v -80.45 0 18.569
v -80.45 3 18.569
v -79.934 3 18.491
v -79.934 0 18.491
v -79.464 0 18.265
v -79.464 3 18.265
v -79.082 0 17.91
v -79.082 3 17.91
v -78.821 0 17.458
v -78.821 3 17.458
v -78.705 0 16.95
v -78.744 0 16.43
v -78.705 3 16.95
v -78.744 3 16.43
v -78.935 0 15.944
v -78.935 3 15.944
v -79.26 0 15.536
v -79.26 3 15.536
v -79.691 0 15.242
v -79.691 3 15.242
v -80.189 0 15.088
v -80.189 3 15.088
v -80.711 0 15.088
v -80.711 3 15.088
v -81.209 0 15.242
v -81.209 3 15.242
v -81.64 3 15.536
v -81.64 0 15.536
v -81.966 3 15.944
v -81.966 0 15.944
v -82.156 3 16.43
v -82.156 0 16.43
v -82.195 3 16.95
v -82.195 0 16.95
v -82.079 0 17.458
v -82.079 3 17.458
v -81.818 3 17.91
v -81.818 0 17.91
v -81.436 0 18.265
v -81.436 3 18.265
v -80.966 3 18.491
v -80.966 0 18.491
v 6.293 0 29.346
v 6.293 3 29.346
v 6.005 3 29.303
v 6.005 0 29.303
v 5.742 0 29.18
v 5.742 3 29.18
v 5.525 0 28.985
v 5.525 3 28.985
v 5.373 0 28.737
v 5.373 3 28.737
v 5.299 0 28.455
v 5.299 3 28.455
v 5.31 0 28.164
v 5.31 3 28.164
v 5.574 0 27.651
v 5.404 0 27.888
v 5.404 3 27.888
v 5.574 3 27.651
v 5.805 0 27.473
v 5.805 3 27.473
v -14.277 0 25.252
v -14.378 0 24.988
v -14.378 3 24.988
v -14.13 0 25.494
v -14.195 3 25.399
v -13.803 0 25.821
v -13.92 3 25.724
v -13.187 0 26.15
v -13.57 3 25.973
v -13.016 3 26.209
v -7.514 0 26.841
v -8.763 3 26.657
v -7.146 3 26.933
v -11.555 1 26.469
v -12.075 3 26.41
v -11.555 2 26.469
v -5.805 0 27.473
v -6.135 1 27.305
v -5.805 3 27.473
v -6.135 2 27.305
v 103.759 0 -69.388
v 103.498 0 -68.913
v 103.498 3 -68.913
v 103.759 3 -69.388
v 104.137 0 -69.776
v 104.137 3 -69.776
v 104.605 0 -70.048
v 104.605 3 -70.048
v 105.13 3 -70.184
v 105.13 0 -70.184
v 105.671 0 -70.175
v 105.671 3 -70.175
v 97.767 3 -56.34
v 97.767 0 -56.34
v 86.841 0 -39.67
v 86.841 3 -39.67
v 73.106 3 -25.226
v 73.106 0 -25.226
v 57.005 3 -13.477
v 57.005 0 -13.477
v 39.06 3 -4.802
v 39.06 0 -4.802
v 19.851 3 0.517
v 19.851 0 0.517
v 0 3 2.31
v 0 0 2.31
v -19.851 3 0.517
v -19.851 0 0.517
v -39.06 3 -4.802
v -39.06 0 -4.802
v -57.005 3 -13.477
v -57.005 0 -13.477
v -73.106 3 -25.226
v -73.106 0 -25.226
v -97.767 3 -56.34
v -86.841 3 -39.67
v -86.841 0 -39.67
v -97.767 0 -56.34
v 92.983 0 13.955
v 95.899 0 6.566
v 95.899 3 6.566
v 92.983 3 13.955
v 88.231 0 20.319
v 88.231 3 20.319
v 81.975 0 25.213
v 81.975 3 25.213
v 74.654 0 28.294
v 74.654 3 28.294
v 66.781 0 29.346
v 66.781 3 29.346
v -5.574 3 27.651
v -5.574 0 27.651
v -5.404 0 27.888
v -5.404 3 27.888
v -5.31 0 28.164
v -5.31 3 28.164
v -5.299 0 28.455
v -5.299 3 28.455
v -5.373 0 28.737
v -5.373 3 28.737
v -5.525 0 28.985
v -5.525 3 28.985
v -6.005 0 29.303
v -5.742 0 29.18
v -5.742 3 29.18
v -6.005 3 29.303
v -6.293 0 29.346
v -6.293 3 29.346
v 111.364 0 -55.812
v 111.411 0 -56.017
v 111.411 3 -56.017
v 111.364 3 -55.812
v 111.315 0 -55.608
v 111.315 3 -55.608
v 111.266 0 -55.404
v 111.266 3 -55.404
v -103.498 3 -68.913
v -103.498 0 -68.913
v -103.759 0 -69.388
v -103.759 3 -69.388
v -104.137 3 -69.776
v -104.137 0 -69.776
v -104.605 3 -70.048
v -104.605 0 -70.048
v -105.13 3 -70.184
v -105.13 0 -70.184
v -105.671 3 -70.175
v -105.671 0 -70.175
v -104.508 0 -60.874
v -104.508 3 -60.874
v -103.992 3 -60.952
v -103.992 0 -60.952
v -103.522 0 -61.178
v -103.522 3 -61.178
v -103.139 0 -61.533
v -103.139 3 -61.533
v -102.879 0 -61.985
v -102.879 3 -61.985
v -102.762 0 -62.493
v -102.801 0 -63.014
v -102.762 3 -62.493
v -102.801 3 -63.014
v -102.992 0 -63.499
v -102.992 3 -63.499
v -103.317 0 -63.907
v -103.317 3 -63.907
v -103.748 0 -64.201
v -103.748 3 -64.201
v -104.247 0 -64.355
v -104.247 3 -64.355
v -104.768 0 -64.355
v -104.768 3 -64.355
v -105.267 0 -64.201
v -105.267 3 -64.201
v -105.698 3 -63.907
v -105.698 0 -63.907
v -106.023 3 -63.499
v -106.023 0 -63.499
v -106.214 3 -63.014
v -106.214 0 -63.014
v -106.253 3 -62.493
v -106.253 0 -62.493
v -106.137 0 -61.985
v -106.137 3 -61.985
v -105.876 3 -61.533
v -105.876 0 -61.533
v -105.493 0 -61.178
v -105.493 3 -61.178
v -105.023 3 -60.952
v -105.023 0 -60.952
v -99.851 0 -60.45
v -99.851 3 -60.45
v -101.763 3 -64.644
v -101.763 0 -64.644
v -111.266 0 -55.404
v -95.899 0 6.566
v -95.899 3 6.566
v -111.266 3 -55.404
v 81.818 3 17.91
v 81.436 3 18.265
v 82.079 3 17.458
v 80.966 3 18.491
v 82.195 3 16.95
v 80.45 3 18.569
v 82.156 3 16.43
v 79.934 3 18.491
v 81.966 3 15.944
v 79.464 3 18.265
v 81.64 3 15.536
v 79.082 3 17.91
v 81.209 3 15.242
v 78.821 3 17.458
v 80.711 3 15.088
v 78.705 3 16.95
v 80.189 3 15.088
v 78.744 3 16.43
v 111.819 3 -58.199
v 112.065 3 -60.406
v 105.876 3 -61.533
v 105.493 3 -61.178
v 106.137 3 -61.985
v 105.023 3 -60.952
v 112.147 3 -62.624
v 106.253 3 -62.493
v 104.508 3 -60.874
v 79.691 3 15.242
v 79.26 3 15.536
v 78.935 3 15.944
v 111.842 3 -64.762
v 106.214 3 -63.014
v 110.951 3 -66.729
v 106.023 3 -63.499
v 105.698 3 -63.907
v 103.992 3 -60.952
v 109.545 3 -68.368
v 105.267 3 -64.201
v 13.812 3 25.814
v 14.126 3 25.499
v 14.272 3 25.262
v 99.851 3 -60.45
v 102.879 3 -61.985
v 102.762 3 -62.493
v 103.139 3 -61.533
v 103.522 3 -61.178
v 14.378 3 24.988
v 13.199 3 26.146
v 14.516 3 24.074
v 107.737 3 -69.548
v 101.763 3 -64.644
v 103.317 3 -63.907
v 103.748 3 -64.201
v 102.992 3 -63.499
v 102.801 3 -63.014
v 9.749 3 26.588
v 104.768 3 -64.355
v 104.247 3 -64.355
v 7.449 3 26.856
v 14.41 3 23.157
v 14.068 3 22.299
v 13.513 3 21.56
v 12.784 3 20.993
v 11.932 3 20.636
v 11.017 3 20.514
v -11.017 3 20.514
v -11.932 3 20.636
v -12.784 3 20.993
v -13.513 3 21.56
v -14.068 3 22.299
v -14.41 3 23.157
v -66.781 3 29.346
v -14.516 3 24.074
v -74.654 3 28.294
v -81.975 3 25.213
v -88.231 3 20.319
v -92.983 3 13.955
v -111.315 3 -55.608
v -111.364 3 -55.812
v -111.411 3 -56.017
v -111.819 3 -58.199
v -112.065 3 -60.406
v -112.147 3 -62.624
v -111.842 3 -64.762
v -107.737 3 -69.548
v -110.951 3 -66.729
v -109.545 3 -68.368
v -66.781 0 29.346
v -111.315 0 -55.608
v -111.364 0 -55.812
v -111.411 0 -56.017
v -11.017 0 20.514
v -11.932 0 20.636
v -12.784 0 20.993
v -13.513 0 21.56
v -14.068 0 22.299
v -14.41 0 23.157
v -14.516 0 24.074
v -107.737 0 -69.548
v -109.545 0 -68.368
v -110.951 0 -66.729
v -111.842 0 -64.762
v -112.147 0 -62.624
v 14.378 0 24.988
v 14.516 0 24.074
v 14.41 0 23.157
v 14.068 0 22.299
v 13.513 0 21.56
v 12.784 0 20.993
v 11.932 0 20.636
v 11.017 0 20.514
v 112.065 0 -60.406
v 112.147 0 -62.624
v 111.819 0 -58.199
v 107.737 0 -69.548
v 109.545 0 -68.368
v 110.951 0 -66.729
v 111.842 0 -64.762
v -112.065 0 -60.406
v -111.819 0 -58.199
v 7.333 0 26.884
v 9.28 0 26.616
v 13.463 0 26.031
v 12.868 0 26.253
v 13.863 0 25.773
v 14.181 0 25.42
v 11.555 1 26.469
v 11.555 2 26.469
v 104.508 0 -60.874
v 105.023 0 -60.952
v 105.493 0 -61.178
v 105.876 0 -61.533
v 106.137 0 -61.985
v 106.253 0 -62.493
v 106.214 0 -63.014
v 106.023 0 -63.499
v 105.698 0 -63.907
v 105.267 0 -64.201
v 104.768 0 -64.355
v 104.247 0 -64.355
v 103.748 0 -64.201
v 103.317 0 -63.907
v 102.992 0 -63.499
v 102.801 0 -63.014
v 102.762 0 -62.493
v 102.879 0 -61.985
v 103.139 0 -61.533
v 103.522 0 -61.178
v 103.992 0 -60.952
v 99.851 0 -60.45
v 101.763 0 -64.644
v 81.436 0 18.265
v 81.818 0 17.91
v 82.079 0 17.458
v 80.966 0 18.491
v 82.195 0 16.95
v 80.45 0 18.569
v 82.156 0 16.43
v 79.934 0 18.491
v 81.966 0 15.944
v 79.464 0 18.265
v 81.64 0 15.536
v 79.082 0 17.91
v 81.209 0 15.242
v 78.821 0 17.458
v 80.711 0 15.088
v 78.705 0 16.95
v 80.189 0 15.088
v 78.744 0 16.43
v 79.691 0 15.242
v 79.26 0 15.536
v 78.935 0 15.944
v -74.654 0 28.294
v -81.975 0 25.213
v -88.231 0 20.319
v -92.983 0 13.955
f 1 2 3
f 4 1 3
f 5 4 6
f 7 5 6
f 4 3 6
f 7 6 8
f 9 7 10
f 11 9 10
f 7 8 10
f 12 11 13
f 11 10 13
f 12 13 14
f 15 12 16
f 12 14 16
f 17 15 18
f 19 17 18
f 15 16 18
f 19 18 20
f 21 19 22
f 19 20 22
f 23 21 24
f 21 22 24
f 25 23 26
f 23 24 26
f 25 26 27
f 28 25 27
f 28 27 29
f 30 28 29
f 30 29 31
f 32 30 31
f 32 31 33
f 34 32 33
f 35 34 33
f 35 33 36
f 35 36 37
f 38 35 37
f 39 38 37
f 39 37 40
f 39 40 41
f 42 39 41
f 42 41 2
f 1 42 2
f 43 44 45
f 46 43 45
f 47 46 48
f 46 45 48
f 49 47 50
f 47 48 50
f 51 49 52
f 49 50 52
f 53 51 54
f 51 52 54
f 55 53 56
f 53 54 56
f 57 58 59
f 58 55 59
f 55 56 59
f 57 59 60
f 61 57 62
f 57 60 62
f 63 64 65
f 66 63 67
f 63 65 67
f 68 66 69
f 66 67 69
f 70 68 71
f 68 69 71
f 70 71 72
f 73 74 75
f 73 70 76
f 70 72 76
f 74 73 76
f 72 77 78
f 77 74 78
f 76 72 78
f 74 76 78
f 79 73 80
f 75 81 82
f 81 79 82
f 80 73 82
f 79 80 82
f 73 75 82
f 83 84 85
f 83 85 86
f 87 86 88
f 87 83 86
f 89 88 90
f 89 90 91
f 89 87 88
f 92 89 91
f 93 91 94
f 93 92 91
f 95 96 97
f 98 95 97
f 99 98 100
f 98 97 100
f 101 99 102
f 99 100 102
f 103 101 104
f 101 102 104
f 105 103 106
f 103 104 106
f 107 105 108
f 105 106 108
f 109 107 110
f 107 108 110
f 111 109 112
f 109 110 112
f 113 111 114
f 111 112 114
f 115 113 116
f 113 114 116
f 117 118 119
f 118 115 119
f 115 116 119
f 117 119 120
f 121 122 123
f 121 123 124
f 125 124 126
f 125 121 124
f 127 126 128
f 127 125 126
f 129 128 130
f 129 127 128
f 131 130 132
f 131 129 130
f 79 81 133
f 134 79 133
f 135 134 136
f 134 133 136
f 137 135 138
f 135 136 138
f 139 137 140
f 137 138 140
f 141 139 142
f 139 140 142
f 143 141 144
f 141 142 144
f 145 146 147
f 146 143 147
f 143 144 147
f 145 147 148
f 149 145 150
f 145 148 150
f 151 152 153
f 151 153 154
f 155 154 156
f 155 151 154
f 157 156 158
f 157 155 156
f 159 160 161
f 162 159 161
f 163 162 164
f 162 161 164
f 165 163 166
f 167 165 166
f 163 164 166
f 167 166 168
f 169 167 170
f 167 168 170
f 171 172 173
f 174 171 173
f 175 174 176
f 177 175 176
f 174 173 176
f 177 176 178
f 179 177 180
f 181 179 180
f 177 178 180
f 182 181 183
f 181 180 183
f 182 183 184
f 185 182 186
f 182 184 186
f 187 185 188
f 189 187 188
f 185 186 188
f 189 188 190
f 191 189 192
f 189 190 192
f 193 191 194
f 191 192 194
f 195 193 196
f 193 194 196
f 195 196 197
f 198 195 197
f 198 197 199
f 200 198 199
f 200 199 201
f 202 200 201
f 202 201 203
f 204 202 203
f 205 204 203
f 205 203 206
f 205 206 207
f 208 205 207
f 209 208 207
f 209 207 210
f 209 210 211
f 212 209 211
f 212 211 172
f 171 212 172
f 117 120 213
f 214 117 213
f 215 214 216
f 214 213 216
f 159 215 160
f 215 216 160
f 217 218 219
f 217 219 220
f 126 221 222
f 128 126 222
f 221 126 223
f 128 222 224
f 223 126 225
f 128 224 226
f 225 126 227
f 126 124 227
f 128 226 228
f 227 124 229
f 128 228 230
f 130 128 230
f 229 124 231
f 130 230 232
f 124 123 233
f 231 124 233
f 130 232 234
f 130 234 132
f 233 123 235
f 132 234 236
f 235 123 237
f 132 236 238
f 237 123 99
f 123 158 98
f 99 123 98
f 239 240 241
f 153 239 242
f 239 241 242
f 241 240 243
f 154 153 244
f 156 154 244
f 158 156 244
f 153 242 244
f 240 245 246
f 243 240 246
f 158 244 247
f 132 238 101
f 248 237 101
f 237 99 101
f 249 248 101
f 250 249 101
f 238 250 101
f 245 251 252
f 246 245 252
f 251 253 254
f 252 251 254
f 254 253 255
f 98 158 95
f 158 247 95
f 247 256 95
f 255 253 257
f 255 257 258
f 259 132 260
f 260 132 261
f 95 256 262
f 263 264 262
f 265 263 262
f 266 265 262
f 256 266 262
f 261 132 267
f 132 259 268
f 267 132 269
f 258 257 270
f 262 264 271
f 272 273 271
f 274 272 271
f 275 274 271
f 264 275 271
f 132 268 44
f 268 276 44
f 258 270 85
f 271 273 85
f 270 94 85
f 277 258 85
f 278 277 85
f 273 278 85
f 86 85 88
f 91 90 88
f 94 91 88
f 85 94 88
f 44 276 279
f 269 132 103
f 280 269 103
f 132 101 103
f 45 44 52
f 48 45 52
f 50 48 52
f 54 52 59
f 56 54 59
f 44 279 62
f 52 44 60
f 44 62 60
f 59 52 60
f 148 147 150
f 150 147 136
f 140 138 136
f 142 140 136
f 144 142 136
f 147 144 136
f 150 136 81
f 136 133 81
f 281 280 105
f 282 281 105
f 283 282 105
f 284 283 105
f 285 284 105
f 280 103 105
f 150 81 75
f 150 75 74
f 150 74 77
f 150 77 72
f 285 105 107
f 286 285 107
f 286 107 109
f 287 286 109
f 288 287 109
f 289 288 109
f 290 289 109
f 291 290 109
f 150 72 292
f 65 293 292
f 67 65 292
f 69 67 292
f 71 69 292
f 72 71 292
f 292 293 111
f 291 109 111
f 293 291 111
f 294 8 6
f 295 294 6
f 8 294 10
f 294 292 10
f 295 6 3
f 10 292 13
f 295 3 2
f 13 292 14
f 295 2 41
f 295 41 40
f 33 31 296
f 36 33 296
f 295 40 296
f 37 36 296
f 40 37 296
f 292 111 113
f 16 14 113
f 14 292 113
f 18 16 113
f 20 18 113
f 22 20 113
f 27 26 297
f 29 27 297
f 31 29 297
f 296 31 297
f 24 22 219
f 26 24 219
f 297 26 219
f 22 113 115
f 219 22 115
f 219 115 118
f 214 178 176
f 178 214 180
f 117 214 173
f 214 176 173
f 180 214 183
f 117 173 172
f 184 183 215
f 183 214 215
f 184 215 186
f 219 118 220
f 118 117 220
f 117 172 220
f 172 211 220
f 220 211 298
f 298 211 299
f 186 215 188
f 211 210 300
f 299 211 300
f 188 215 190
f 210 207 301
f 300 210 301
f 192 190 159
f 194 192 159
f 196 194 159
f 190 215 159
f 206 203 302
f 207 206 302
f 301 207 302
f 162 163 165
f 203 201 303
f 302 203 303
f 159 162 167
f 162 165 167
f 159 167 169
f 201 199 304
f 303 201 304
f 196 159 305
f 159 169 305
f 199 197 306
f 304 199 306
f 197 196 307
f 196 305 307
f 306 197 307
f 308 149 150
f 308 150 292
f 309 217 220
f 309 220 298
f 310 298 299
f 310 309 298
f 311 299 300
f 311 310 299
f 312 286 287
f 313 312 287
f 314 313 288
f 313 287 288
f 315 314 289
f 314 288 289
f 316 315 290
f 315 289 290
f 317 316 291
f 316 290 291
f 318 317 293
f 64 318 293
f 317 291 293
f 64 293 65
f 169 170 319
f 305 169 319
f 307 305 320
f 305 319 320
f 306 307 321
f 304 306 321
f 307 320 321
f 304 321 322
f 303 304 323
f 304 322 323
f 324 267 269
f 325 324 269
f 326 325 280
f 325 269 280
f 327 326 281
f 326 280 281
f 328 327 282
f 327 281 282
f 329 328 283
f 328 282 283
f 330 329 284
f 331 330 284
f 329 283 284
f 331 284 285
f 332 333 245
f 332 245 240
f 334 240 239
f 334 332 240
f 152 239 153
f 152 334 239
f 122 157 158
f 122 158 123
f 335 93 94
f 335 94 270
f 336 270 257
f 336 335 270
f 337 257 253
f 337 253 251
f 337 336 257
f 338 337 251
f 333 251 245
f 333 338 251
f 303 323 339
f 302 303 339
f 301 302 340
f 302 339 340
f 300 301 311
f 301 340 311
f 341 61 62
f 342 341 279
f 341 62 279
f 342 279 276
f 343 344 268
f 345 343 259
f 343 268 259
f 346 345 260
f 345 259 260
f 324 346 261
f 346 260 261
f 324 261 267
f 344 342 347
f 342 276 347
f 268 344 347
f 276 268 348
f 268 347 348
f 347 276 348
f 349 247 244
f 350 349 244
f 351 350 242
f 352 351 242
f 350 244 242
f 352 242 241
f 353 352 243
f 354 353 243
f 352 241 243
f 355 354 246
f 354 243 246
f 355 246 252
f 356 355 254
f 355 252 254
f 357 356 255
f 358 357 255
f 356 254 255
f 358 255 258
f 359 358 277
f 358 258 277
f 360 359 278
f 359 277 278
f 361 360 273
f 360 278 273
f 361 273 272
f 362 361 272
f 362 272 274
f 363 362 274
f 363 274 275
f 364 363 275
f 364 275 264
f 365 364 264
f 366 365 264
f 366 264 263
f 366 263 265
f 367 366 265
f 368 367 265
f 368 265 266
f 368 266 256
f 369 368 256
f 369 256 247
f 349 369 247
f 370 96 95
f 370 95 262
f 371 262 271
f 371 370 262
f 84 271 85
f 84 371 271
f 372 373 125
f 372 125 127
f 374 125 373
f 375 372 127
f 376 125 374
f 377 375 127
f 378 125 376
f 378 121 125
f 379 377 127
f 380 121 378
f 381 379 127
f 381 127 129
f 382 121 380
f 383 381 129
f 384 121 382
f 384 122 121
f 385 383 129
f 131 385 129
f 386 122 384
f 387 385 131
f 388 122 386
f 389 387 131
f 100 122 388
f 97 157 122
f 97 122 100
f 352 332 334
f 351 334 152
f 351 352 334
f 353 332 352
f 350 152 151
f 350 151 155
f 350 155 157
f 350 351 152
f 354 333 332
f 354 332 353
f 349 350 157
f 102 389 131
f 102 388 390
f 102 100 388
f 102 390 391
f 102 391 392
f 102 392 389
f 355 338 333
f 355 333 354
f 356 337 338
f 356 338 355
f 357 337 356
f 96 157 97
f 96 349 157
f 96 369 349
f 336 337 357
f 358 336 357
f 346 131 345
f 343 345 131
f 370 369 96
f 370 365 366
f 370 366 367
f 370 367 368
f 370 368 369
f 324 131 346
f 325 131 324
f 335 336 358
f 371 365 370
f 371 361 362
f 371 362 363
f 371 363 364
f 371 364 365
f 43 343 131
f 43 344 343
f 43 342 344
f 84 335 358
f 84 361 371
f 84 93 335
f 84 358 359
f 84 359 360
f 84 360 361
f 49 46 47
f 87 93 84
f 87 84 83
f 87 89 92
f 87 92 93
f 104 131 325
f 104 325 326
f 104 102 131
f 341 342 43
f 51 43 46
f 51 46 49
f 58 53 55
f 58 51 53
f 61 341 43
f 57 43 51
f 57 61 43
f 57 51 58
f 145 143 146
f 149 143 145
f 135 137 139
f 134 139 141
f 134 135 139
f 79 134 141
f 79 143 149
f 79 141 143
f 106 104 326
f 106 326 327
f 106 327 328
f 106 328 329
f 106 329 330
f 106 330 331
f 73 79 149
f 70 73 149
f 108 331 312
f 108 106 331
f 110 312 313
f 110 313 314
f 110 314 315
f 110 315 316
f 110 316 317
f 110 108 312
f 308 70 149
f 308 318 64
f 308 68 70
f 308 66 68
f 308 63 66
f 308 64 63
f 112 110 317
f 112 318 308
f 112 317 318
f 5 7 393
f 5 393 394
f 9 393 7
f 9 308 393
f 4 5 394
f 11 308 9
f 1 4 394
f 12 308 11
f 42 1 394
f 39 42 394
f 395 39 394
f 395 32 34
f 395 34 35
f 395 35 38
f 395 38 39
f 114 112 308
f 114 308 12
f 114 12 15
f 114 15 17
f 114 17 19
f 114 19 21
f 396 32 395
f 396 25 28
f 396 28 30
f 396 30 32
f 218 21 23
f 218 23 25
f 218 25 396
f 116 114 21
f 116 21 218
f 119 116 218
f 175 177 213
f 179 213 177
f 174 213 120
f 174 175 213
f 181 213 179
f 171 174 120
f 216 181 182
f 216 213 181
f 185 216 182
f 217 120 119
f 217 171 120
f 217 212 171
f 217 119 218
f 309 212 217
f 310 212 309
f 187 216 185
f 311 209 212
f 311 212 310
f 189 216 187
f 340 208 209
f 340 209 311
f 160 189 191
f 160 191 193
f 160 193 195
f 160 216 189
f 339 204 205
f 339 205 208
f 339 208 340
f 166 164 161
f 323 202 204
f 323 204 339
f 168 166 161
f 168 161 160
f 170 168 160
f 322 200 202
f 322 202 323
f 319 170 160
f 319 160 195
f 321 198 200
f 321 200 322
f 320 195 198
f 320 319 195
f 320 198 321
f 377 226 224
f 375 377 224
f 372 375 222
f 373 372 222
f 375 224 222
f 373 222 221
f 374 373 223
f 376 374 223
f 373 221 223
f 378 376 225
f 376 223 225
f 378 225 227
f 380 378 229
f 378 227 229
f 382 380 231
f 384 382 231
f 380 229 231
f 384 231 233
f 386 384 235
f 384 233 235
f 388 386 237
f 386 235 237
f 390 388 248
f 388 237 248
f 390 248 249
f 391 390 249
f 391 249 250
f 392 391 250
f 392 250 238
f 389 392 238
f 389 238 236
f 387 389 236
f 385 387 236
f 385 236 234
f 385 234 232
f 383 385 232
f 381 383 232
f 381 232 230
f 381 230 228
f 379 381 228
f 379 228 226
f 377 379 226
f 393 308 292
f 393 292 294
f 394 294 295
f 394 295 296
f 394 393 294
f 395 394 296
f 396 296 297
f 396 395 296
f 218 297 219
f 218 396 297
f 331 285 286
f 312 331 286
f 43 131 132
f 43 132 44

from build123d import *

# Parameters (mm, degrees)
EXTRUDE_1_DEPTH     = 3
CUT_EXTRUDE_1_DEPTH = 10
EXTRUDE_START       = -3
EXTRUDE_2_DEPTH     = 3
SKETCH_4_R          = 1.75
CUT_EXTRUDE_2_DEPTH = 10
CUT_EXTRUDE_3_DEPTH = 10


with BuildPart() as part:
    # 草图1 → 凸台-拉伸1 (new body)
    with BuildSketch(Plane(origin=(0, 0, 0), x_dir=(1, 0, 0), z_dir=(0, 1, 0))):
        with BuildLine():
            Line((-66.78059141, 154.593992167), (66.78059141, 154.593992167))
            ThreePointArc((66.78059141, 154.593992167), (85.265515034, 148.222525736), (95.898700635, 131.814498742))
            Line((95.898700635, 131.814498742), (111.265547961, 69.844672358))
            ThreePointArc((111.265547961, 69.844672358), (112.147438737, 62.624165782), (111.265547961, 55.403659207))
            Line((111.265547961, 55.403659207), (95.898700635, -6.566167178))
            ThreePointArc((95.898700635, -6.566167178), (85.265515034, -22.974194171), (66.78059141, -29.345660602))
            Line((66.78059141, -29.345660602), (-66.78059141, -29.345660602))
            ThreePointArc((-66.78059141, -29.345660602), (-85.265515034, -22.974194171), (-95.898700635, -6.566167178))
            Line((-95.898700635, -6.566167178), (-111.265547961, 55.403659207))
            ThreePointArc((-111.265547961, 55.403659207), (-112.147438737, 62.624165782), (-111.265547961, 69.844672358))
            Line((-111.265547961, 69.844672358), (-95.898700635, 131.814498742))
            ThreePointArc((-95.898700635, 131.814498742), (-85.265515034, 148.222525736), (-66.78059141, 154.593992167))
        make_face()
    extrude(amount=EXTRUDE_1_DEPTH)

    # 草图2 → 切除-拉伸1 (cut)
    with BuildSketch(Plane.XZ):
        with BuildLine():
            Line((95.898700635, -131.814498742), (111.265547961, -69.844672358))
            ThreePointArc((111.265547961, -69.844672358), (112.145783913, -62.939263665), (111.410792816, -56.016888883))
            ThreePointArc((111.410792816, -56.016888883), (104.688448853, -60.381556842), (97.766986015, -56.340073582))
            ThreePointArc((97.766986015, -56.340073582), (0, 2.309946502), (-97.766986015, -56.340073582))
            ThreePointArc((-97.766986015, -56.340073582), (-104.688448853, -60.381556842), (-111.410792816, -56.016888883))
            ThreePointArc((-111.410792816, -56.016888883), (-112.145783913, -62.939263665), (-111.265547961, -69.844672358))
            Line((-111.265547961, -69.844672358), (-95.898700635, -131.814498742))
            ThreePointArc((-95.898700635, -131.814498742), (-85.265515034, -148.222525736), (-66.78059141, -154.593992167))
            Line((-66.78059141, -154.593992167), (66.78059141, -154.593992167))
            ThreePointArc((66.78059141, -154.593992167), (85.265515034, -148.222525736), (95.898700635, -131.814498742))
        make_face()
    extrude(amount=-CUT_EXTRUDE_1_DEPTH, mode=Mode.SUBTRACT)

    # 草图3 → 凸台-拉伸2 (add)
    with BuildSketch(Plane(origin=(0, 3, 0), x_dir=(1, 0, 0), z_dir=(0, 1, 0)).offset(EXTRUDE_START)):
        with BuildLine():
            Line((111.265547961, 55.403659207), (97.047161675, 55.012754554))
            ThreePointArc((97.047161675, 55.012754554), (100.513394998, 61.851126086), (103.498491265, 68.91280428))
            ThreePointArc((103.498491265, 68.91280428), (104.361855318, 69.927640036), (105.671102633, 70.174946664))
            ThreePointArc((105.671102633, 70.174946664), (110.30657274, 67.598027995), (112.147438737, 62.624165782))
            ThreePointArc((112.147438737, 62.624165782), (111.926149897, 58.98708431), (111.265547961, 55.403659207))
        make_face()
        with BuildLine():
            Line((-111.265547961, 55.403659207), (-97.047161675, 55.012754554))
            ThreePointArc((-97.047161675, 55.012754554), (-100.513394998, 61.851126086), (-103.498491265, 68.91280428))
            ThreePointArc((-103.498491265, 68.91280428), (-104.361855318, 69.927640036), (-105.671102633, 70.174946664))
            ThreePointArc((-105.671102633, 70.174946664), (-110.30657274, 67.598027995), (-112.147438737, 62.624165782))
            ThreePointArc((-112.147438737, 62.624165782), (-111.926149897, 58.98708431), (-111.265547961, 55.403659207))
        make_face()
    extrude(amount=EXTRUDE_2_DEPTH)

    # 草图4 → 切除-拉伸2 (cut)
    with BuildSketch(Plane(origin=(0, 3, 0), x_dir=(1, 0, 0), z_dir=(0, 1, 0))):
        with Locations(Location((104.507530951, 62.624165782, 0), (0, 0, 270))):
            Circle(SKETCH_4_R)
        with Locations(Location((-104.507530951, 62.624165782, 0), (0, 0, 270))):
            Circle(SKETCH_4_R)
        with Locations(Location((80.450184708, -16.818951307, 0), (0, 0, 270))):
            Circle(SKETCH_4_R)
        with Locations(Location((-80.450184708, -16.818951307, 0), (0, 0, 270))):
            Circle(SKETCH_4_R)
    extrude(amount=-CUT_EXTRUDE_2_DEPTH, mode=Mode.SUBTRACT)

    # 草图5 → 切除-拉伸3 (cut)
    with BuildSketch(Plane(origin=(0, 3, 0), x_dir=(1, 0, 0), z_dir=(0, 1, 0))):
        with BuildLine():
            Line((11.016648097, -20.513898252), (-11.016648097, -20.513898252))
            ThreePointArc((-11.016648097, -20.513898252), (-13.814702514, -21.911306641), (-14.378457093, -24.987674549))
            add(Edge.make_bspline(
                [(-14.378457093, -24.987674549), (-14.050661547, -26.11933694), (-10.489346867, -26.76009099), (-7.724749574, -26.493757466), (-5.904508816, -27.417302496), (-5.804576355, -27.473305111)],
                knots=[0, 0, 0, 0, 0.274123853, 0.745489655, 0.777393608, 0.777393608, 0.777393608, 0.777393608], degree=3))
            ThreePointArc((-5.804576355, -27.473305111), (-5.325885634, -28.59829127), (-6.293448421, -29.345660602))
            Line((-6.293448421, -29.345660602), (6.293448421, -29.345660602))
            ThreePointArc((6.293448421, -29.345660602), (5.325885634, -28.59829127), (5.804576355, -27.473305111))
            add(Edge.make_bspline(
                [(5.804576355, -27.473305111), (5.904508816, -27.417302496), (7.724749574, -26.493757466), (10.489346867, -26.76009099), (14.050661547, -26.11933694), (14.378457093, -24.987674549)],
                knots=[0, 0, 0, 0, 0.031903952, 0.503269754, 0.777393608, 0.777393608, 0.777393608, 0.777393608], degree=3))
            ThreePointArc((14.378457093, -24.987674549), (13.814702514, -21.911306641), (11.016648097, -20.513898252))
        make_face()
    extrude(amount=-CUT_EXTRUDE_3_DEPTH, mode=Mode.SUBTRACT)


solid = part.part
